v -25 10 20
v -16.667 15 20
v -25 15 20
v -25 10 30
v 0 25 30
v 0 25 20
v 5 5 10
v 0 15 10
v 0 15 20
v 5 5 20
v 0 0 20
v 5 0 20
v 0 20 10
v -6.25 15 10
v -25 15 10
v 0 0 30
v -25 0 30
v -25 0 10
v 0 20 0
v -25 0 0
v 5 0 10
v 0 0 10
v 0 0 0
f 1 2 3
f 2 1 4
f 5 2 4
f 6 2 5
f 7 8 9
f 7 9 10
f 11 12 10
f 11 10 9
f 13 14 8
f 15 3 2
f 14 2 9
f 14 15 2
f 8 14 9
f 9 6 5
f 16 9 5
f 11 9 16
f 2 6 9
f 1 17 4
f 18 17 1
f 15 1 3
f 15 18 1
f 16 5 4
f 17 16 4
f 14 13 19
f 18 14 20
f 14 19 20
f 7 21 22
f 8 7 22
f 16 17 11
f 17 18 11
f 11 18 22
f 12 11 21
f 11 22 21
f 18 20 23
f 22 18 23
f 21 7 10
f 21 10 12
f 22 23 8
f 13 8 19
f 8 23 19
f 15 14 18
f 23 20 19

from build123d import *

# Parameters (mm, degrees)
BOSS_EXTRUDE9_DEPTH  = 10
BOSS_EXTRUDE10_DEPTH = 10
SKETCH8_W            = 25
SKETCH8_H            = 10
BOSS_EXTRUDE11_DEPTH = 10
BOSS_EXTRUDE12_DEPTH = 10


with BuildPart() as part:
    # Sketch1 → Boss-Extrude9 (new body)
    with BuildSketch(Plane.XY):
        Polygon((-25, 0), (0, 0), (0, 20), align=None)
    extrude(amount=BOSS_EXTRUDE9_DEPTH)

    # Sketch7 → Boss-Extrude10 (add)
    with BuildSketch(Plane.XY.offset(10)):
        Polygon((-25, 0), (-25, 15), (0, 15), (5, 5), (5, 0), align=None)
    extrude(amount=BOSS_EXTRUDE10_DEPTH)

    # Sketch8 → Boss-Extrude11 (add)
    with BuildSketch(Plane.XY.offset(20)):
        with Locations((-12.5, 5)):
            Rectangle(SKETCH8_W, SKETCH8_H)
    extrude(amount=BOSS_EXTRUDE11_DEPTH)

    # Sketch9 → Boss-Extrude12 (add)
    with BuildSketch(Plane.XY.offset(20)):
        Polygon((-25, 10), (0, 25), (0, 10), align=None)
    extrude(amount=BOSS_EXTRUDE12_DEPTH)


solid = part.part
